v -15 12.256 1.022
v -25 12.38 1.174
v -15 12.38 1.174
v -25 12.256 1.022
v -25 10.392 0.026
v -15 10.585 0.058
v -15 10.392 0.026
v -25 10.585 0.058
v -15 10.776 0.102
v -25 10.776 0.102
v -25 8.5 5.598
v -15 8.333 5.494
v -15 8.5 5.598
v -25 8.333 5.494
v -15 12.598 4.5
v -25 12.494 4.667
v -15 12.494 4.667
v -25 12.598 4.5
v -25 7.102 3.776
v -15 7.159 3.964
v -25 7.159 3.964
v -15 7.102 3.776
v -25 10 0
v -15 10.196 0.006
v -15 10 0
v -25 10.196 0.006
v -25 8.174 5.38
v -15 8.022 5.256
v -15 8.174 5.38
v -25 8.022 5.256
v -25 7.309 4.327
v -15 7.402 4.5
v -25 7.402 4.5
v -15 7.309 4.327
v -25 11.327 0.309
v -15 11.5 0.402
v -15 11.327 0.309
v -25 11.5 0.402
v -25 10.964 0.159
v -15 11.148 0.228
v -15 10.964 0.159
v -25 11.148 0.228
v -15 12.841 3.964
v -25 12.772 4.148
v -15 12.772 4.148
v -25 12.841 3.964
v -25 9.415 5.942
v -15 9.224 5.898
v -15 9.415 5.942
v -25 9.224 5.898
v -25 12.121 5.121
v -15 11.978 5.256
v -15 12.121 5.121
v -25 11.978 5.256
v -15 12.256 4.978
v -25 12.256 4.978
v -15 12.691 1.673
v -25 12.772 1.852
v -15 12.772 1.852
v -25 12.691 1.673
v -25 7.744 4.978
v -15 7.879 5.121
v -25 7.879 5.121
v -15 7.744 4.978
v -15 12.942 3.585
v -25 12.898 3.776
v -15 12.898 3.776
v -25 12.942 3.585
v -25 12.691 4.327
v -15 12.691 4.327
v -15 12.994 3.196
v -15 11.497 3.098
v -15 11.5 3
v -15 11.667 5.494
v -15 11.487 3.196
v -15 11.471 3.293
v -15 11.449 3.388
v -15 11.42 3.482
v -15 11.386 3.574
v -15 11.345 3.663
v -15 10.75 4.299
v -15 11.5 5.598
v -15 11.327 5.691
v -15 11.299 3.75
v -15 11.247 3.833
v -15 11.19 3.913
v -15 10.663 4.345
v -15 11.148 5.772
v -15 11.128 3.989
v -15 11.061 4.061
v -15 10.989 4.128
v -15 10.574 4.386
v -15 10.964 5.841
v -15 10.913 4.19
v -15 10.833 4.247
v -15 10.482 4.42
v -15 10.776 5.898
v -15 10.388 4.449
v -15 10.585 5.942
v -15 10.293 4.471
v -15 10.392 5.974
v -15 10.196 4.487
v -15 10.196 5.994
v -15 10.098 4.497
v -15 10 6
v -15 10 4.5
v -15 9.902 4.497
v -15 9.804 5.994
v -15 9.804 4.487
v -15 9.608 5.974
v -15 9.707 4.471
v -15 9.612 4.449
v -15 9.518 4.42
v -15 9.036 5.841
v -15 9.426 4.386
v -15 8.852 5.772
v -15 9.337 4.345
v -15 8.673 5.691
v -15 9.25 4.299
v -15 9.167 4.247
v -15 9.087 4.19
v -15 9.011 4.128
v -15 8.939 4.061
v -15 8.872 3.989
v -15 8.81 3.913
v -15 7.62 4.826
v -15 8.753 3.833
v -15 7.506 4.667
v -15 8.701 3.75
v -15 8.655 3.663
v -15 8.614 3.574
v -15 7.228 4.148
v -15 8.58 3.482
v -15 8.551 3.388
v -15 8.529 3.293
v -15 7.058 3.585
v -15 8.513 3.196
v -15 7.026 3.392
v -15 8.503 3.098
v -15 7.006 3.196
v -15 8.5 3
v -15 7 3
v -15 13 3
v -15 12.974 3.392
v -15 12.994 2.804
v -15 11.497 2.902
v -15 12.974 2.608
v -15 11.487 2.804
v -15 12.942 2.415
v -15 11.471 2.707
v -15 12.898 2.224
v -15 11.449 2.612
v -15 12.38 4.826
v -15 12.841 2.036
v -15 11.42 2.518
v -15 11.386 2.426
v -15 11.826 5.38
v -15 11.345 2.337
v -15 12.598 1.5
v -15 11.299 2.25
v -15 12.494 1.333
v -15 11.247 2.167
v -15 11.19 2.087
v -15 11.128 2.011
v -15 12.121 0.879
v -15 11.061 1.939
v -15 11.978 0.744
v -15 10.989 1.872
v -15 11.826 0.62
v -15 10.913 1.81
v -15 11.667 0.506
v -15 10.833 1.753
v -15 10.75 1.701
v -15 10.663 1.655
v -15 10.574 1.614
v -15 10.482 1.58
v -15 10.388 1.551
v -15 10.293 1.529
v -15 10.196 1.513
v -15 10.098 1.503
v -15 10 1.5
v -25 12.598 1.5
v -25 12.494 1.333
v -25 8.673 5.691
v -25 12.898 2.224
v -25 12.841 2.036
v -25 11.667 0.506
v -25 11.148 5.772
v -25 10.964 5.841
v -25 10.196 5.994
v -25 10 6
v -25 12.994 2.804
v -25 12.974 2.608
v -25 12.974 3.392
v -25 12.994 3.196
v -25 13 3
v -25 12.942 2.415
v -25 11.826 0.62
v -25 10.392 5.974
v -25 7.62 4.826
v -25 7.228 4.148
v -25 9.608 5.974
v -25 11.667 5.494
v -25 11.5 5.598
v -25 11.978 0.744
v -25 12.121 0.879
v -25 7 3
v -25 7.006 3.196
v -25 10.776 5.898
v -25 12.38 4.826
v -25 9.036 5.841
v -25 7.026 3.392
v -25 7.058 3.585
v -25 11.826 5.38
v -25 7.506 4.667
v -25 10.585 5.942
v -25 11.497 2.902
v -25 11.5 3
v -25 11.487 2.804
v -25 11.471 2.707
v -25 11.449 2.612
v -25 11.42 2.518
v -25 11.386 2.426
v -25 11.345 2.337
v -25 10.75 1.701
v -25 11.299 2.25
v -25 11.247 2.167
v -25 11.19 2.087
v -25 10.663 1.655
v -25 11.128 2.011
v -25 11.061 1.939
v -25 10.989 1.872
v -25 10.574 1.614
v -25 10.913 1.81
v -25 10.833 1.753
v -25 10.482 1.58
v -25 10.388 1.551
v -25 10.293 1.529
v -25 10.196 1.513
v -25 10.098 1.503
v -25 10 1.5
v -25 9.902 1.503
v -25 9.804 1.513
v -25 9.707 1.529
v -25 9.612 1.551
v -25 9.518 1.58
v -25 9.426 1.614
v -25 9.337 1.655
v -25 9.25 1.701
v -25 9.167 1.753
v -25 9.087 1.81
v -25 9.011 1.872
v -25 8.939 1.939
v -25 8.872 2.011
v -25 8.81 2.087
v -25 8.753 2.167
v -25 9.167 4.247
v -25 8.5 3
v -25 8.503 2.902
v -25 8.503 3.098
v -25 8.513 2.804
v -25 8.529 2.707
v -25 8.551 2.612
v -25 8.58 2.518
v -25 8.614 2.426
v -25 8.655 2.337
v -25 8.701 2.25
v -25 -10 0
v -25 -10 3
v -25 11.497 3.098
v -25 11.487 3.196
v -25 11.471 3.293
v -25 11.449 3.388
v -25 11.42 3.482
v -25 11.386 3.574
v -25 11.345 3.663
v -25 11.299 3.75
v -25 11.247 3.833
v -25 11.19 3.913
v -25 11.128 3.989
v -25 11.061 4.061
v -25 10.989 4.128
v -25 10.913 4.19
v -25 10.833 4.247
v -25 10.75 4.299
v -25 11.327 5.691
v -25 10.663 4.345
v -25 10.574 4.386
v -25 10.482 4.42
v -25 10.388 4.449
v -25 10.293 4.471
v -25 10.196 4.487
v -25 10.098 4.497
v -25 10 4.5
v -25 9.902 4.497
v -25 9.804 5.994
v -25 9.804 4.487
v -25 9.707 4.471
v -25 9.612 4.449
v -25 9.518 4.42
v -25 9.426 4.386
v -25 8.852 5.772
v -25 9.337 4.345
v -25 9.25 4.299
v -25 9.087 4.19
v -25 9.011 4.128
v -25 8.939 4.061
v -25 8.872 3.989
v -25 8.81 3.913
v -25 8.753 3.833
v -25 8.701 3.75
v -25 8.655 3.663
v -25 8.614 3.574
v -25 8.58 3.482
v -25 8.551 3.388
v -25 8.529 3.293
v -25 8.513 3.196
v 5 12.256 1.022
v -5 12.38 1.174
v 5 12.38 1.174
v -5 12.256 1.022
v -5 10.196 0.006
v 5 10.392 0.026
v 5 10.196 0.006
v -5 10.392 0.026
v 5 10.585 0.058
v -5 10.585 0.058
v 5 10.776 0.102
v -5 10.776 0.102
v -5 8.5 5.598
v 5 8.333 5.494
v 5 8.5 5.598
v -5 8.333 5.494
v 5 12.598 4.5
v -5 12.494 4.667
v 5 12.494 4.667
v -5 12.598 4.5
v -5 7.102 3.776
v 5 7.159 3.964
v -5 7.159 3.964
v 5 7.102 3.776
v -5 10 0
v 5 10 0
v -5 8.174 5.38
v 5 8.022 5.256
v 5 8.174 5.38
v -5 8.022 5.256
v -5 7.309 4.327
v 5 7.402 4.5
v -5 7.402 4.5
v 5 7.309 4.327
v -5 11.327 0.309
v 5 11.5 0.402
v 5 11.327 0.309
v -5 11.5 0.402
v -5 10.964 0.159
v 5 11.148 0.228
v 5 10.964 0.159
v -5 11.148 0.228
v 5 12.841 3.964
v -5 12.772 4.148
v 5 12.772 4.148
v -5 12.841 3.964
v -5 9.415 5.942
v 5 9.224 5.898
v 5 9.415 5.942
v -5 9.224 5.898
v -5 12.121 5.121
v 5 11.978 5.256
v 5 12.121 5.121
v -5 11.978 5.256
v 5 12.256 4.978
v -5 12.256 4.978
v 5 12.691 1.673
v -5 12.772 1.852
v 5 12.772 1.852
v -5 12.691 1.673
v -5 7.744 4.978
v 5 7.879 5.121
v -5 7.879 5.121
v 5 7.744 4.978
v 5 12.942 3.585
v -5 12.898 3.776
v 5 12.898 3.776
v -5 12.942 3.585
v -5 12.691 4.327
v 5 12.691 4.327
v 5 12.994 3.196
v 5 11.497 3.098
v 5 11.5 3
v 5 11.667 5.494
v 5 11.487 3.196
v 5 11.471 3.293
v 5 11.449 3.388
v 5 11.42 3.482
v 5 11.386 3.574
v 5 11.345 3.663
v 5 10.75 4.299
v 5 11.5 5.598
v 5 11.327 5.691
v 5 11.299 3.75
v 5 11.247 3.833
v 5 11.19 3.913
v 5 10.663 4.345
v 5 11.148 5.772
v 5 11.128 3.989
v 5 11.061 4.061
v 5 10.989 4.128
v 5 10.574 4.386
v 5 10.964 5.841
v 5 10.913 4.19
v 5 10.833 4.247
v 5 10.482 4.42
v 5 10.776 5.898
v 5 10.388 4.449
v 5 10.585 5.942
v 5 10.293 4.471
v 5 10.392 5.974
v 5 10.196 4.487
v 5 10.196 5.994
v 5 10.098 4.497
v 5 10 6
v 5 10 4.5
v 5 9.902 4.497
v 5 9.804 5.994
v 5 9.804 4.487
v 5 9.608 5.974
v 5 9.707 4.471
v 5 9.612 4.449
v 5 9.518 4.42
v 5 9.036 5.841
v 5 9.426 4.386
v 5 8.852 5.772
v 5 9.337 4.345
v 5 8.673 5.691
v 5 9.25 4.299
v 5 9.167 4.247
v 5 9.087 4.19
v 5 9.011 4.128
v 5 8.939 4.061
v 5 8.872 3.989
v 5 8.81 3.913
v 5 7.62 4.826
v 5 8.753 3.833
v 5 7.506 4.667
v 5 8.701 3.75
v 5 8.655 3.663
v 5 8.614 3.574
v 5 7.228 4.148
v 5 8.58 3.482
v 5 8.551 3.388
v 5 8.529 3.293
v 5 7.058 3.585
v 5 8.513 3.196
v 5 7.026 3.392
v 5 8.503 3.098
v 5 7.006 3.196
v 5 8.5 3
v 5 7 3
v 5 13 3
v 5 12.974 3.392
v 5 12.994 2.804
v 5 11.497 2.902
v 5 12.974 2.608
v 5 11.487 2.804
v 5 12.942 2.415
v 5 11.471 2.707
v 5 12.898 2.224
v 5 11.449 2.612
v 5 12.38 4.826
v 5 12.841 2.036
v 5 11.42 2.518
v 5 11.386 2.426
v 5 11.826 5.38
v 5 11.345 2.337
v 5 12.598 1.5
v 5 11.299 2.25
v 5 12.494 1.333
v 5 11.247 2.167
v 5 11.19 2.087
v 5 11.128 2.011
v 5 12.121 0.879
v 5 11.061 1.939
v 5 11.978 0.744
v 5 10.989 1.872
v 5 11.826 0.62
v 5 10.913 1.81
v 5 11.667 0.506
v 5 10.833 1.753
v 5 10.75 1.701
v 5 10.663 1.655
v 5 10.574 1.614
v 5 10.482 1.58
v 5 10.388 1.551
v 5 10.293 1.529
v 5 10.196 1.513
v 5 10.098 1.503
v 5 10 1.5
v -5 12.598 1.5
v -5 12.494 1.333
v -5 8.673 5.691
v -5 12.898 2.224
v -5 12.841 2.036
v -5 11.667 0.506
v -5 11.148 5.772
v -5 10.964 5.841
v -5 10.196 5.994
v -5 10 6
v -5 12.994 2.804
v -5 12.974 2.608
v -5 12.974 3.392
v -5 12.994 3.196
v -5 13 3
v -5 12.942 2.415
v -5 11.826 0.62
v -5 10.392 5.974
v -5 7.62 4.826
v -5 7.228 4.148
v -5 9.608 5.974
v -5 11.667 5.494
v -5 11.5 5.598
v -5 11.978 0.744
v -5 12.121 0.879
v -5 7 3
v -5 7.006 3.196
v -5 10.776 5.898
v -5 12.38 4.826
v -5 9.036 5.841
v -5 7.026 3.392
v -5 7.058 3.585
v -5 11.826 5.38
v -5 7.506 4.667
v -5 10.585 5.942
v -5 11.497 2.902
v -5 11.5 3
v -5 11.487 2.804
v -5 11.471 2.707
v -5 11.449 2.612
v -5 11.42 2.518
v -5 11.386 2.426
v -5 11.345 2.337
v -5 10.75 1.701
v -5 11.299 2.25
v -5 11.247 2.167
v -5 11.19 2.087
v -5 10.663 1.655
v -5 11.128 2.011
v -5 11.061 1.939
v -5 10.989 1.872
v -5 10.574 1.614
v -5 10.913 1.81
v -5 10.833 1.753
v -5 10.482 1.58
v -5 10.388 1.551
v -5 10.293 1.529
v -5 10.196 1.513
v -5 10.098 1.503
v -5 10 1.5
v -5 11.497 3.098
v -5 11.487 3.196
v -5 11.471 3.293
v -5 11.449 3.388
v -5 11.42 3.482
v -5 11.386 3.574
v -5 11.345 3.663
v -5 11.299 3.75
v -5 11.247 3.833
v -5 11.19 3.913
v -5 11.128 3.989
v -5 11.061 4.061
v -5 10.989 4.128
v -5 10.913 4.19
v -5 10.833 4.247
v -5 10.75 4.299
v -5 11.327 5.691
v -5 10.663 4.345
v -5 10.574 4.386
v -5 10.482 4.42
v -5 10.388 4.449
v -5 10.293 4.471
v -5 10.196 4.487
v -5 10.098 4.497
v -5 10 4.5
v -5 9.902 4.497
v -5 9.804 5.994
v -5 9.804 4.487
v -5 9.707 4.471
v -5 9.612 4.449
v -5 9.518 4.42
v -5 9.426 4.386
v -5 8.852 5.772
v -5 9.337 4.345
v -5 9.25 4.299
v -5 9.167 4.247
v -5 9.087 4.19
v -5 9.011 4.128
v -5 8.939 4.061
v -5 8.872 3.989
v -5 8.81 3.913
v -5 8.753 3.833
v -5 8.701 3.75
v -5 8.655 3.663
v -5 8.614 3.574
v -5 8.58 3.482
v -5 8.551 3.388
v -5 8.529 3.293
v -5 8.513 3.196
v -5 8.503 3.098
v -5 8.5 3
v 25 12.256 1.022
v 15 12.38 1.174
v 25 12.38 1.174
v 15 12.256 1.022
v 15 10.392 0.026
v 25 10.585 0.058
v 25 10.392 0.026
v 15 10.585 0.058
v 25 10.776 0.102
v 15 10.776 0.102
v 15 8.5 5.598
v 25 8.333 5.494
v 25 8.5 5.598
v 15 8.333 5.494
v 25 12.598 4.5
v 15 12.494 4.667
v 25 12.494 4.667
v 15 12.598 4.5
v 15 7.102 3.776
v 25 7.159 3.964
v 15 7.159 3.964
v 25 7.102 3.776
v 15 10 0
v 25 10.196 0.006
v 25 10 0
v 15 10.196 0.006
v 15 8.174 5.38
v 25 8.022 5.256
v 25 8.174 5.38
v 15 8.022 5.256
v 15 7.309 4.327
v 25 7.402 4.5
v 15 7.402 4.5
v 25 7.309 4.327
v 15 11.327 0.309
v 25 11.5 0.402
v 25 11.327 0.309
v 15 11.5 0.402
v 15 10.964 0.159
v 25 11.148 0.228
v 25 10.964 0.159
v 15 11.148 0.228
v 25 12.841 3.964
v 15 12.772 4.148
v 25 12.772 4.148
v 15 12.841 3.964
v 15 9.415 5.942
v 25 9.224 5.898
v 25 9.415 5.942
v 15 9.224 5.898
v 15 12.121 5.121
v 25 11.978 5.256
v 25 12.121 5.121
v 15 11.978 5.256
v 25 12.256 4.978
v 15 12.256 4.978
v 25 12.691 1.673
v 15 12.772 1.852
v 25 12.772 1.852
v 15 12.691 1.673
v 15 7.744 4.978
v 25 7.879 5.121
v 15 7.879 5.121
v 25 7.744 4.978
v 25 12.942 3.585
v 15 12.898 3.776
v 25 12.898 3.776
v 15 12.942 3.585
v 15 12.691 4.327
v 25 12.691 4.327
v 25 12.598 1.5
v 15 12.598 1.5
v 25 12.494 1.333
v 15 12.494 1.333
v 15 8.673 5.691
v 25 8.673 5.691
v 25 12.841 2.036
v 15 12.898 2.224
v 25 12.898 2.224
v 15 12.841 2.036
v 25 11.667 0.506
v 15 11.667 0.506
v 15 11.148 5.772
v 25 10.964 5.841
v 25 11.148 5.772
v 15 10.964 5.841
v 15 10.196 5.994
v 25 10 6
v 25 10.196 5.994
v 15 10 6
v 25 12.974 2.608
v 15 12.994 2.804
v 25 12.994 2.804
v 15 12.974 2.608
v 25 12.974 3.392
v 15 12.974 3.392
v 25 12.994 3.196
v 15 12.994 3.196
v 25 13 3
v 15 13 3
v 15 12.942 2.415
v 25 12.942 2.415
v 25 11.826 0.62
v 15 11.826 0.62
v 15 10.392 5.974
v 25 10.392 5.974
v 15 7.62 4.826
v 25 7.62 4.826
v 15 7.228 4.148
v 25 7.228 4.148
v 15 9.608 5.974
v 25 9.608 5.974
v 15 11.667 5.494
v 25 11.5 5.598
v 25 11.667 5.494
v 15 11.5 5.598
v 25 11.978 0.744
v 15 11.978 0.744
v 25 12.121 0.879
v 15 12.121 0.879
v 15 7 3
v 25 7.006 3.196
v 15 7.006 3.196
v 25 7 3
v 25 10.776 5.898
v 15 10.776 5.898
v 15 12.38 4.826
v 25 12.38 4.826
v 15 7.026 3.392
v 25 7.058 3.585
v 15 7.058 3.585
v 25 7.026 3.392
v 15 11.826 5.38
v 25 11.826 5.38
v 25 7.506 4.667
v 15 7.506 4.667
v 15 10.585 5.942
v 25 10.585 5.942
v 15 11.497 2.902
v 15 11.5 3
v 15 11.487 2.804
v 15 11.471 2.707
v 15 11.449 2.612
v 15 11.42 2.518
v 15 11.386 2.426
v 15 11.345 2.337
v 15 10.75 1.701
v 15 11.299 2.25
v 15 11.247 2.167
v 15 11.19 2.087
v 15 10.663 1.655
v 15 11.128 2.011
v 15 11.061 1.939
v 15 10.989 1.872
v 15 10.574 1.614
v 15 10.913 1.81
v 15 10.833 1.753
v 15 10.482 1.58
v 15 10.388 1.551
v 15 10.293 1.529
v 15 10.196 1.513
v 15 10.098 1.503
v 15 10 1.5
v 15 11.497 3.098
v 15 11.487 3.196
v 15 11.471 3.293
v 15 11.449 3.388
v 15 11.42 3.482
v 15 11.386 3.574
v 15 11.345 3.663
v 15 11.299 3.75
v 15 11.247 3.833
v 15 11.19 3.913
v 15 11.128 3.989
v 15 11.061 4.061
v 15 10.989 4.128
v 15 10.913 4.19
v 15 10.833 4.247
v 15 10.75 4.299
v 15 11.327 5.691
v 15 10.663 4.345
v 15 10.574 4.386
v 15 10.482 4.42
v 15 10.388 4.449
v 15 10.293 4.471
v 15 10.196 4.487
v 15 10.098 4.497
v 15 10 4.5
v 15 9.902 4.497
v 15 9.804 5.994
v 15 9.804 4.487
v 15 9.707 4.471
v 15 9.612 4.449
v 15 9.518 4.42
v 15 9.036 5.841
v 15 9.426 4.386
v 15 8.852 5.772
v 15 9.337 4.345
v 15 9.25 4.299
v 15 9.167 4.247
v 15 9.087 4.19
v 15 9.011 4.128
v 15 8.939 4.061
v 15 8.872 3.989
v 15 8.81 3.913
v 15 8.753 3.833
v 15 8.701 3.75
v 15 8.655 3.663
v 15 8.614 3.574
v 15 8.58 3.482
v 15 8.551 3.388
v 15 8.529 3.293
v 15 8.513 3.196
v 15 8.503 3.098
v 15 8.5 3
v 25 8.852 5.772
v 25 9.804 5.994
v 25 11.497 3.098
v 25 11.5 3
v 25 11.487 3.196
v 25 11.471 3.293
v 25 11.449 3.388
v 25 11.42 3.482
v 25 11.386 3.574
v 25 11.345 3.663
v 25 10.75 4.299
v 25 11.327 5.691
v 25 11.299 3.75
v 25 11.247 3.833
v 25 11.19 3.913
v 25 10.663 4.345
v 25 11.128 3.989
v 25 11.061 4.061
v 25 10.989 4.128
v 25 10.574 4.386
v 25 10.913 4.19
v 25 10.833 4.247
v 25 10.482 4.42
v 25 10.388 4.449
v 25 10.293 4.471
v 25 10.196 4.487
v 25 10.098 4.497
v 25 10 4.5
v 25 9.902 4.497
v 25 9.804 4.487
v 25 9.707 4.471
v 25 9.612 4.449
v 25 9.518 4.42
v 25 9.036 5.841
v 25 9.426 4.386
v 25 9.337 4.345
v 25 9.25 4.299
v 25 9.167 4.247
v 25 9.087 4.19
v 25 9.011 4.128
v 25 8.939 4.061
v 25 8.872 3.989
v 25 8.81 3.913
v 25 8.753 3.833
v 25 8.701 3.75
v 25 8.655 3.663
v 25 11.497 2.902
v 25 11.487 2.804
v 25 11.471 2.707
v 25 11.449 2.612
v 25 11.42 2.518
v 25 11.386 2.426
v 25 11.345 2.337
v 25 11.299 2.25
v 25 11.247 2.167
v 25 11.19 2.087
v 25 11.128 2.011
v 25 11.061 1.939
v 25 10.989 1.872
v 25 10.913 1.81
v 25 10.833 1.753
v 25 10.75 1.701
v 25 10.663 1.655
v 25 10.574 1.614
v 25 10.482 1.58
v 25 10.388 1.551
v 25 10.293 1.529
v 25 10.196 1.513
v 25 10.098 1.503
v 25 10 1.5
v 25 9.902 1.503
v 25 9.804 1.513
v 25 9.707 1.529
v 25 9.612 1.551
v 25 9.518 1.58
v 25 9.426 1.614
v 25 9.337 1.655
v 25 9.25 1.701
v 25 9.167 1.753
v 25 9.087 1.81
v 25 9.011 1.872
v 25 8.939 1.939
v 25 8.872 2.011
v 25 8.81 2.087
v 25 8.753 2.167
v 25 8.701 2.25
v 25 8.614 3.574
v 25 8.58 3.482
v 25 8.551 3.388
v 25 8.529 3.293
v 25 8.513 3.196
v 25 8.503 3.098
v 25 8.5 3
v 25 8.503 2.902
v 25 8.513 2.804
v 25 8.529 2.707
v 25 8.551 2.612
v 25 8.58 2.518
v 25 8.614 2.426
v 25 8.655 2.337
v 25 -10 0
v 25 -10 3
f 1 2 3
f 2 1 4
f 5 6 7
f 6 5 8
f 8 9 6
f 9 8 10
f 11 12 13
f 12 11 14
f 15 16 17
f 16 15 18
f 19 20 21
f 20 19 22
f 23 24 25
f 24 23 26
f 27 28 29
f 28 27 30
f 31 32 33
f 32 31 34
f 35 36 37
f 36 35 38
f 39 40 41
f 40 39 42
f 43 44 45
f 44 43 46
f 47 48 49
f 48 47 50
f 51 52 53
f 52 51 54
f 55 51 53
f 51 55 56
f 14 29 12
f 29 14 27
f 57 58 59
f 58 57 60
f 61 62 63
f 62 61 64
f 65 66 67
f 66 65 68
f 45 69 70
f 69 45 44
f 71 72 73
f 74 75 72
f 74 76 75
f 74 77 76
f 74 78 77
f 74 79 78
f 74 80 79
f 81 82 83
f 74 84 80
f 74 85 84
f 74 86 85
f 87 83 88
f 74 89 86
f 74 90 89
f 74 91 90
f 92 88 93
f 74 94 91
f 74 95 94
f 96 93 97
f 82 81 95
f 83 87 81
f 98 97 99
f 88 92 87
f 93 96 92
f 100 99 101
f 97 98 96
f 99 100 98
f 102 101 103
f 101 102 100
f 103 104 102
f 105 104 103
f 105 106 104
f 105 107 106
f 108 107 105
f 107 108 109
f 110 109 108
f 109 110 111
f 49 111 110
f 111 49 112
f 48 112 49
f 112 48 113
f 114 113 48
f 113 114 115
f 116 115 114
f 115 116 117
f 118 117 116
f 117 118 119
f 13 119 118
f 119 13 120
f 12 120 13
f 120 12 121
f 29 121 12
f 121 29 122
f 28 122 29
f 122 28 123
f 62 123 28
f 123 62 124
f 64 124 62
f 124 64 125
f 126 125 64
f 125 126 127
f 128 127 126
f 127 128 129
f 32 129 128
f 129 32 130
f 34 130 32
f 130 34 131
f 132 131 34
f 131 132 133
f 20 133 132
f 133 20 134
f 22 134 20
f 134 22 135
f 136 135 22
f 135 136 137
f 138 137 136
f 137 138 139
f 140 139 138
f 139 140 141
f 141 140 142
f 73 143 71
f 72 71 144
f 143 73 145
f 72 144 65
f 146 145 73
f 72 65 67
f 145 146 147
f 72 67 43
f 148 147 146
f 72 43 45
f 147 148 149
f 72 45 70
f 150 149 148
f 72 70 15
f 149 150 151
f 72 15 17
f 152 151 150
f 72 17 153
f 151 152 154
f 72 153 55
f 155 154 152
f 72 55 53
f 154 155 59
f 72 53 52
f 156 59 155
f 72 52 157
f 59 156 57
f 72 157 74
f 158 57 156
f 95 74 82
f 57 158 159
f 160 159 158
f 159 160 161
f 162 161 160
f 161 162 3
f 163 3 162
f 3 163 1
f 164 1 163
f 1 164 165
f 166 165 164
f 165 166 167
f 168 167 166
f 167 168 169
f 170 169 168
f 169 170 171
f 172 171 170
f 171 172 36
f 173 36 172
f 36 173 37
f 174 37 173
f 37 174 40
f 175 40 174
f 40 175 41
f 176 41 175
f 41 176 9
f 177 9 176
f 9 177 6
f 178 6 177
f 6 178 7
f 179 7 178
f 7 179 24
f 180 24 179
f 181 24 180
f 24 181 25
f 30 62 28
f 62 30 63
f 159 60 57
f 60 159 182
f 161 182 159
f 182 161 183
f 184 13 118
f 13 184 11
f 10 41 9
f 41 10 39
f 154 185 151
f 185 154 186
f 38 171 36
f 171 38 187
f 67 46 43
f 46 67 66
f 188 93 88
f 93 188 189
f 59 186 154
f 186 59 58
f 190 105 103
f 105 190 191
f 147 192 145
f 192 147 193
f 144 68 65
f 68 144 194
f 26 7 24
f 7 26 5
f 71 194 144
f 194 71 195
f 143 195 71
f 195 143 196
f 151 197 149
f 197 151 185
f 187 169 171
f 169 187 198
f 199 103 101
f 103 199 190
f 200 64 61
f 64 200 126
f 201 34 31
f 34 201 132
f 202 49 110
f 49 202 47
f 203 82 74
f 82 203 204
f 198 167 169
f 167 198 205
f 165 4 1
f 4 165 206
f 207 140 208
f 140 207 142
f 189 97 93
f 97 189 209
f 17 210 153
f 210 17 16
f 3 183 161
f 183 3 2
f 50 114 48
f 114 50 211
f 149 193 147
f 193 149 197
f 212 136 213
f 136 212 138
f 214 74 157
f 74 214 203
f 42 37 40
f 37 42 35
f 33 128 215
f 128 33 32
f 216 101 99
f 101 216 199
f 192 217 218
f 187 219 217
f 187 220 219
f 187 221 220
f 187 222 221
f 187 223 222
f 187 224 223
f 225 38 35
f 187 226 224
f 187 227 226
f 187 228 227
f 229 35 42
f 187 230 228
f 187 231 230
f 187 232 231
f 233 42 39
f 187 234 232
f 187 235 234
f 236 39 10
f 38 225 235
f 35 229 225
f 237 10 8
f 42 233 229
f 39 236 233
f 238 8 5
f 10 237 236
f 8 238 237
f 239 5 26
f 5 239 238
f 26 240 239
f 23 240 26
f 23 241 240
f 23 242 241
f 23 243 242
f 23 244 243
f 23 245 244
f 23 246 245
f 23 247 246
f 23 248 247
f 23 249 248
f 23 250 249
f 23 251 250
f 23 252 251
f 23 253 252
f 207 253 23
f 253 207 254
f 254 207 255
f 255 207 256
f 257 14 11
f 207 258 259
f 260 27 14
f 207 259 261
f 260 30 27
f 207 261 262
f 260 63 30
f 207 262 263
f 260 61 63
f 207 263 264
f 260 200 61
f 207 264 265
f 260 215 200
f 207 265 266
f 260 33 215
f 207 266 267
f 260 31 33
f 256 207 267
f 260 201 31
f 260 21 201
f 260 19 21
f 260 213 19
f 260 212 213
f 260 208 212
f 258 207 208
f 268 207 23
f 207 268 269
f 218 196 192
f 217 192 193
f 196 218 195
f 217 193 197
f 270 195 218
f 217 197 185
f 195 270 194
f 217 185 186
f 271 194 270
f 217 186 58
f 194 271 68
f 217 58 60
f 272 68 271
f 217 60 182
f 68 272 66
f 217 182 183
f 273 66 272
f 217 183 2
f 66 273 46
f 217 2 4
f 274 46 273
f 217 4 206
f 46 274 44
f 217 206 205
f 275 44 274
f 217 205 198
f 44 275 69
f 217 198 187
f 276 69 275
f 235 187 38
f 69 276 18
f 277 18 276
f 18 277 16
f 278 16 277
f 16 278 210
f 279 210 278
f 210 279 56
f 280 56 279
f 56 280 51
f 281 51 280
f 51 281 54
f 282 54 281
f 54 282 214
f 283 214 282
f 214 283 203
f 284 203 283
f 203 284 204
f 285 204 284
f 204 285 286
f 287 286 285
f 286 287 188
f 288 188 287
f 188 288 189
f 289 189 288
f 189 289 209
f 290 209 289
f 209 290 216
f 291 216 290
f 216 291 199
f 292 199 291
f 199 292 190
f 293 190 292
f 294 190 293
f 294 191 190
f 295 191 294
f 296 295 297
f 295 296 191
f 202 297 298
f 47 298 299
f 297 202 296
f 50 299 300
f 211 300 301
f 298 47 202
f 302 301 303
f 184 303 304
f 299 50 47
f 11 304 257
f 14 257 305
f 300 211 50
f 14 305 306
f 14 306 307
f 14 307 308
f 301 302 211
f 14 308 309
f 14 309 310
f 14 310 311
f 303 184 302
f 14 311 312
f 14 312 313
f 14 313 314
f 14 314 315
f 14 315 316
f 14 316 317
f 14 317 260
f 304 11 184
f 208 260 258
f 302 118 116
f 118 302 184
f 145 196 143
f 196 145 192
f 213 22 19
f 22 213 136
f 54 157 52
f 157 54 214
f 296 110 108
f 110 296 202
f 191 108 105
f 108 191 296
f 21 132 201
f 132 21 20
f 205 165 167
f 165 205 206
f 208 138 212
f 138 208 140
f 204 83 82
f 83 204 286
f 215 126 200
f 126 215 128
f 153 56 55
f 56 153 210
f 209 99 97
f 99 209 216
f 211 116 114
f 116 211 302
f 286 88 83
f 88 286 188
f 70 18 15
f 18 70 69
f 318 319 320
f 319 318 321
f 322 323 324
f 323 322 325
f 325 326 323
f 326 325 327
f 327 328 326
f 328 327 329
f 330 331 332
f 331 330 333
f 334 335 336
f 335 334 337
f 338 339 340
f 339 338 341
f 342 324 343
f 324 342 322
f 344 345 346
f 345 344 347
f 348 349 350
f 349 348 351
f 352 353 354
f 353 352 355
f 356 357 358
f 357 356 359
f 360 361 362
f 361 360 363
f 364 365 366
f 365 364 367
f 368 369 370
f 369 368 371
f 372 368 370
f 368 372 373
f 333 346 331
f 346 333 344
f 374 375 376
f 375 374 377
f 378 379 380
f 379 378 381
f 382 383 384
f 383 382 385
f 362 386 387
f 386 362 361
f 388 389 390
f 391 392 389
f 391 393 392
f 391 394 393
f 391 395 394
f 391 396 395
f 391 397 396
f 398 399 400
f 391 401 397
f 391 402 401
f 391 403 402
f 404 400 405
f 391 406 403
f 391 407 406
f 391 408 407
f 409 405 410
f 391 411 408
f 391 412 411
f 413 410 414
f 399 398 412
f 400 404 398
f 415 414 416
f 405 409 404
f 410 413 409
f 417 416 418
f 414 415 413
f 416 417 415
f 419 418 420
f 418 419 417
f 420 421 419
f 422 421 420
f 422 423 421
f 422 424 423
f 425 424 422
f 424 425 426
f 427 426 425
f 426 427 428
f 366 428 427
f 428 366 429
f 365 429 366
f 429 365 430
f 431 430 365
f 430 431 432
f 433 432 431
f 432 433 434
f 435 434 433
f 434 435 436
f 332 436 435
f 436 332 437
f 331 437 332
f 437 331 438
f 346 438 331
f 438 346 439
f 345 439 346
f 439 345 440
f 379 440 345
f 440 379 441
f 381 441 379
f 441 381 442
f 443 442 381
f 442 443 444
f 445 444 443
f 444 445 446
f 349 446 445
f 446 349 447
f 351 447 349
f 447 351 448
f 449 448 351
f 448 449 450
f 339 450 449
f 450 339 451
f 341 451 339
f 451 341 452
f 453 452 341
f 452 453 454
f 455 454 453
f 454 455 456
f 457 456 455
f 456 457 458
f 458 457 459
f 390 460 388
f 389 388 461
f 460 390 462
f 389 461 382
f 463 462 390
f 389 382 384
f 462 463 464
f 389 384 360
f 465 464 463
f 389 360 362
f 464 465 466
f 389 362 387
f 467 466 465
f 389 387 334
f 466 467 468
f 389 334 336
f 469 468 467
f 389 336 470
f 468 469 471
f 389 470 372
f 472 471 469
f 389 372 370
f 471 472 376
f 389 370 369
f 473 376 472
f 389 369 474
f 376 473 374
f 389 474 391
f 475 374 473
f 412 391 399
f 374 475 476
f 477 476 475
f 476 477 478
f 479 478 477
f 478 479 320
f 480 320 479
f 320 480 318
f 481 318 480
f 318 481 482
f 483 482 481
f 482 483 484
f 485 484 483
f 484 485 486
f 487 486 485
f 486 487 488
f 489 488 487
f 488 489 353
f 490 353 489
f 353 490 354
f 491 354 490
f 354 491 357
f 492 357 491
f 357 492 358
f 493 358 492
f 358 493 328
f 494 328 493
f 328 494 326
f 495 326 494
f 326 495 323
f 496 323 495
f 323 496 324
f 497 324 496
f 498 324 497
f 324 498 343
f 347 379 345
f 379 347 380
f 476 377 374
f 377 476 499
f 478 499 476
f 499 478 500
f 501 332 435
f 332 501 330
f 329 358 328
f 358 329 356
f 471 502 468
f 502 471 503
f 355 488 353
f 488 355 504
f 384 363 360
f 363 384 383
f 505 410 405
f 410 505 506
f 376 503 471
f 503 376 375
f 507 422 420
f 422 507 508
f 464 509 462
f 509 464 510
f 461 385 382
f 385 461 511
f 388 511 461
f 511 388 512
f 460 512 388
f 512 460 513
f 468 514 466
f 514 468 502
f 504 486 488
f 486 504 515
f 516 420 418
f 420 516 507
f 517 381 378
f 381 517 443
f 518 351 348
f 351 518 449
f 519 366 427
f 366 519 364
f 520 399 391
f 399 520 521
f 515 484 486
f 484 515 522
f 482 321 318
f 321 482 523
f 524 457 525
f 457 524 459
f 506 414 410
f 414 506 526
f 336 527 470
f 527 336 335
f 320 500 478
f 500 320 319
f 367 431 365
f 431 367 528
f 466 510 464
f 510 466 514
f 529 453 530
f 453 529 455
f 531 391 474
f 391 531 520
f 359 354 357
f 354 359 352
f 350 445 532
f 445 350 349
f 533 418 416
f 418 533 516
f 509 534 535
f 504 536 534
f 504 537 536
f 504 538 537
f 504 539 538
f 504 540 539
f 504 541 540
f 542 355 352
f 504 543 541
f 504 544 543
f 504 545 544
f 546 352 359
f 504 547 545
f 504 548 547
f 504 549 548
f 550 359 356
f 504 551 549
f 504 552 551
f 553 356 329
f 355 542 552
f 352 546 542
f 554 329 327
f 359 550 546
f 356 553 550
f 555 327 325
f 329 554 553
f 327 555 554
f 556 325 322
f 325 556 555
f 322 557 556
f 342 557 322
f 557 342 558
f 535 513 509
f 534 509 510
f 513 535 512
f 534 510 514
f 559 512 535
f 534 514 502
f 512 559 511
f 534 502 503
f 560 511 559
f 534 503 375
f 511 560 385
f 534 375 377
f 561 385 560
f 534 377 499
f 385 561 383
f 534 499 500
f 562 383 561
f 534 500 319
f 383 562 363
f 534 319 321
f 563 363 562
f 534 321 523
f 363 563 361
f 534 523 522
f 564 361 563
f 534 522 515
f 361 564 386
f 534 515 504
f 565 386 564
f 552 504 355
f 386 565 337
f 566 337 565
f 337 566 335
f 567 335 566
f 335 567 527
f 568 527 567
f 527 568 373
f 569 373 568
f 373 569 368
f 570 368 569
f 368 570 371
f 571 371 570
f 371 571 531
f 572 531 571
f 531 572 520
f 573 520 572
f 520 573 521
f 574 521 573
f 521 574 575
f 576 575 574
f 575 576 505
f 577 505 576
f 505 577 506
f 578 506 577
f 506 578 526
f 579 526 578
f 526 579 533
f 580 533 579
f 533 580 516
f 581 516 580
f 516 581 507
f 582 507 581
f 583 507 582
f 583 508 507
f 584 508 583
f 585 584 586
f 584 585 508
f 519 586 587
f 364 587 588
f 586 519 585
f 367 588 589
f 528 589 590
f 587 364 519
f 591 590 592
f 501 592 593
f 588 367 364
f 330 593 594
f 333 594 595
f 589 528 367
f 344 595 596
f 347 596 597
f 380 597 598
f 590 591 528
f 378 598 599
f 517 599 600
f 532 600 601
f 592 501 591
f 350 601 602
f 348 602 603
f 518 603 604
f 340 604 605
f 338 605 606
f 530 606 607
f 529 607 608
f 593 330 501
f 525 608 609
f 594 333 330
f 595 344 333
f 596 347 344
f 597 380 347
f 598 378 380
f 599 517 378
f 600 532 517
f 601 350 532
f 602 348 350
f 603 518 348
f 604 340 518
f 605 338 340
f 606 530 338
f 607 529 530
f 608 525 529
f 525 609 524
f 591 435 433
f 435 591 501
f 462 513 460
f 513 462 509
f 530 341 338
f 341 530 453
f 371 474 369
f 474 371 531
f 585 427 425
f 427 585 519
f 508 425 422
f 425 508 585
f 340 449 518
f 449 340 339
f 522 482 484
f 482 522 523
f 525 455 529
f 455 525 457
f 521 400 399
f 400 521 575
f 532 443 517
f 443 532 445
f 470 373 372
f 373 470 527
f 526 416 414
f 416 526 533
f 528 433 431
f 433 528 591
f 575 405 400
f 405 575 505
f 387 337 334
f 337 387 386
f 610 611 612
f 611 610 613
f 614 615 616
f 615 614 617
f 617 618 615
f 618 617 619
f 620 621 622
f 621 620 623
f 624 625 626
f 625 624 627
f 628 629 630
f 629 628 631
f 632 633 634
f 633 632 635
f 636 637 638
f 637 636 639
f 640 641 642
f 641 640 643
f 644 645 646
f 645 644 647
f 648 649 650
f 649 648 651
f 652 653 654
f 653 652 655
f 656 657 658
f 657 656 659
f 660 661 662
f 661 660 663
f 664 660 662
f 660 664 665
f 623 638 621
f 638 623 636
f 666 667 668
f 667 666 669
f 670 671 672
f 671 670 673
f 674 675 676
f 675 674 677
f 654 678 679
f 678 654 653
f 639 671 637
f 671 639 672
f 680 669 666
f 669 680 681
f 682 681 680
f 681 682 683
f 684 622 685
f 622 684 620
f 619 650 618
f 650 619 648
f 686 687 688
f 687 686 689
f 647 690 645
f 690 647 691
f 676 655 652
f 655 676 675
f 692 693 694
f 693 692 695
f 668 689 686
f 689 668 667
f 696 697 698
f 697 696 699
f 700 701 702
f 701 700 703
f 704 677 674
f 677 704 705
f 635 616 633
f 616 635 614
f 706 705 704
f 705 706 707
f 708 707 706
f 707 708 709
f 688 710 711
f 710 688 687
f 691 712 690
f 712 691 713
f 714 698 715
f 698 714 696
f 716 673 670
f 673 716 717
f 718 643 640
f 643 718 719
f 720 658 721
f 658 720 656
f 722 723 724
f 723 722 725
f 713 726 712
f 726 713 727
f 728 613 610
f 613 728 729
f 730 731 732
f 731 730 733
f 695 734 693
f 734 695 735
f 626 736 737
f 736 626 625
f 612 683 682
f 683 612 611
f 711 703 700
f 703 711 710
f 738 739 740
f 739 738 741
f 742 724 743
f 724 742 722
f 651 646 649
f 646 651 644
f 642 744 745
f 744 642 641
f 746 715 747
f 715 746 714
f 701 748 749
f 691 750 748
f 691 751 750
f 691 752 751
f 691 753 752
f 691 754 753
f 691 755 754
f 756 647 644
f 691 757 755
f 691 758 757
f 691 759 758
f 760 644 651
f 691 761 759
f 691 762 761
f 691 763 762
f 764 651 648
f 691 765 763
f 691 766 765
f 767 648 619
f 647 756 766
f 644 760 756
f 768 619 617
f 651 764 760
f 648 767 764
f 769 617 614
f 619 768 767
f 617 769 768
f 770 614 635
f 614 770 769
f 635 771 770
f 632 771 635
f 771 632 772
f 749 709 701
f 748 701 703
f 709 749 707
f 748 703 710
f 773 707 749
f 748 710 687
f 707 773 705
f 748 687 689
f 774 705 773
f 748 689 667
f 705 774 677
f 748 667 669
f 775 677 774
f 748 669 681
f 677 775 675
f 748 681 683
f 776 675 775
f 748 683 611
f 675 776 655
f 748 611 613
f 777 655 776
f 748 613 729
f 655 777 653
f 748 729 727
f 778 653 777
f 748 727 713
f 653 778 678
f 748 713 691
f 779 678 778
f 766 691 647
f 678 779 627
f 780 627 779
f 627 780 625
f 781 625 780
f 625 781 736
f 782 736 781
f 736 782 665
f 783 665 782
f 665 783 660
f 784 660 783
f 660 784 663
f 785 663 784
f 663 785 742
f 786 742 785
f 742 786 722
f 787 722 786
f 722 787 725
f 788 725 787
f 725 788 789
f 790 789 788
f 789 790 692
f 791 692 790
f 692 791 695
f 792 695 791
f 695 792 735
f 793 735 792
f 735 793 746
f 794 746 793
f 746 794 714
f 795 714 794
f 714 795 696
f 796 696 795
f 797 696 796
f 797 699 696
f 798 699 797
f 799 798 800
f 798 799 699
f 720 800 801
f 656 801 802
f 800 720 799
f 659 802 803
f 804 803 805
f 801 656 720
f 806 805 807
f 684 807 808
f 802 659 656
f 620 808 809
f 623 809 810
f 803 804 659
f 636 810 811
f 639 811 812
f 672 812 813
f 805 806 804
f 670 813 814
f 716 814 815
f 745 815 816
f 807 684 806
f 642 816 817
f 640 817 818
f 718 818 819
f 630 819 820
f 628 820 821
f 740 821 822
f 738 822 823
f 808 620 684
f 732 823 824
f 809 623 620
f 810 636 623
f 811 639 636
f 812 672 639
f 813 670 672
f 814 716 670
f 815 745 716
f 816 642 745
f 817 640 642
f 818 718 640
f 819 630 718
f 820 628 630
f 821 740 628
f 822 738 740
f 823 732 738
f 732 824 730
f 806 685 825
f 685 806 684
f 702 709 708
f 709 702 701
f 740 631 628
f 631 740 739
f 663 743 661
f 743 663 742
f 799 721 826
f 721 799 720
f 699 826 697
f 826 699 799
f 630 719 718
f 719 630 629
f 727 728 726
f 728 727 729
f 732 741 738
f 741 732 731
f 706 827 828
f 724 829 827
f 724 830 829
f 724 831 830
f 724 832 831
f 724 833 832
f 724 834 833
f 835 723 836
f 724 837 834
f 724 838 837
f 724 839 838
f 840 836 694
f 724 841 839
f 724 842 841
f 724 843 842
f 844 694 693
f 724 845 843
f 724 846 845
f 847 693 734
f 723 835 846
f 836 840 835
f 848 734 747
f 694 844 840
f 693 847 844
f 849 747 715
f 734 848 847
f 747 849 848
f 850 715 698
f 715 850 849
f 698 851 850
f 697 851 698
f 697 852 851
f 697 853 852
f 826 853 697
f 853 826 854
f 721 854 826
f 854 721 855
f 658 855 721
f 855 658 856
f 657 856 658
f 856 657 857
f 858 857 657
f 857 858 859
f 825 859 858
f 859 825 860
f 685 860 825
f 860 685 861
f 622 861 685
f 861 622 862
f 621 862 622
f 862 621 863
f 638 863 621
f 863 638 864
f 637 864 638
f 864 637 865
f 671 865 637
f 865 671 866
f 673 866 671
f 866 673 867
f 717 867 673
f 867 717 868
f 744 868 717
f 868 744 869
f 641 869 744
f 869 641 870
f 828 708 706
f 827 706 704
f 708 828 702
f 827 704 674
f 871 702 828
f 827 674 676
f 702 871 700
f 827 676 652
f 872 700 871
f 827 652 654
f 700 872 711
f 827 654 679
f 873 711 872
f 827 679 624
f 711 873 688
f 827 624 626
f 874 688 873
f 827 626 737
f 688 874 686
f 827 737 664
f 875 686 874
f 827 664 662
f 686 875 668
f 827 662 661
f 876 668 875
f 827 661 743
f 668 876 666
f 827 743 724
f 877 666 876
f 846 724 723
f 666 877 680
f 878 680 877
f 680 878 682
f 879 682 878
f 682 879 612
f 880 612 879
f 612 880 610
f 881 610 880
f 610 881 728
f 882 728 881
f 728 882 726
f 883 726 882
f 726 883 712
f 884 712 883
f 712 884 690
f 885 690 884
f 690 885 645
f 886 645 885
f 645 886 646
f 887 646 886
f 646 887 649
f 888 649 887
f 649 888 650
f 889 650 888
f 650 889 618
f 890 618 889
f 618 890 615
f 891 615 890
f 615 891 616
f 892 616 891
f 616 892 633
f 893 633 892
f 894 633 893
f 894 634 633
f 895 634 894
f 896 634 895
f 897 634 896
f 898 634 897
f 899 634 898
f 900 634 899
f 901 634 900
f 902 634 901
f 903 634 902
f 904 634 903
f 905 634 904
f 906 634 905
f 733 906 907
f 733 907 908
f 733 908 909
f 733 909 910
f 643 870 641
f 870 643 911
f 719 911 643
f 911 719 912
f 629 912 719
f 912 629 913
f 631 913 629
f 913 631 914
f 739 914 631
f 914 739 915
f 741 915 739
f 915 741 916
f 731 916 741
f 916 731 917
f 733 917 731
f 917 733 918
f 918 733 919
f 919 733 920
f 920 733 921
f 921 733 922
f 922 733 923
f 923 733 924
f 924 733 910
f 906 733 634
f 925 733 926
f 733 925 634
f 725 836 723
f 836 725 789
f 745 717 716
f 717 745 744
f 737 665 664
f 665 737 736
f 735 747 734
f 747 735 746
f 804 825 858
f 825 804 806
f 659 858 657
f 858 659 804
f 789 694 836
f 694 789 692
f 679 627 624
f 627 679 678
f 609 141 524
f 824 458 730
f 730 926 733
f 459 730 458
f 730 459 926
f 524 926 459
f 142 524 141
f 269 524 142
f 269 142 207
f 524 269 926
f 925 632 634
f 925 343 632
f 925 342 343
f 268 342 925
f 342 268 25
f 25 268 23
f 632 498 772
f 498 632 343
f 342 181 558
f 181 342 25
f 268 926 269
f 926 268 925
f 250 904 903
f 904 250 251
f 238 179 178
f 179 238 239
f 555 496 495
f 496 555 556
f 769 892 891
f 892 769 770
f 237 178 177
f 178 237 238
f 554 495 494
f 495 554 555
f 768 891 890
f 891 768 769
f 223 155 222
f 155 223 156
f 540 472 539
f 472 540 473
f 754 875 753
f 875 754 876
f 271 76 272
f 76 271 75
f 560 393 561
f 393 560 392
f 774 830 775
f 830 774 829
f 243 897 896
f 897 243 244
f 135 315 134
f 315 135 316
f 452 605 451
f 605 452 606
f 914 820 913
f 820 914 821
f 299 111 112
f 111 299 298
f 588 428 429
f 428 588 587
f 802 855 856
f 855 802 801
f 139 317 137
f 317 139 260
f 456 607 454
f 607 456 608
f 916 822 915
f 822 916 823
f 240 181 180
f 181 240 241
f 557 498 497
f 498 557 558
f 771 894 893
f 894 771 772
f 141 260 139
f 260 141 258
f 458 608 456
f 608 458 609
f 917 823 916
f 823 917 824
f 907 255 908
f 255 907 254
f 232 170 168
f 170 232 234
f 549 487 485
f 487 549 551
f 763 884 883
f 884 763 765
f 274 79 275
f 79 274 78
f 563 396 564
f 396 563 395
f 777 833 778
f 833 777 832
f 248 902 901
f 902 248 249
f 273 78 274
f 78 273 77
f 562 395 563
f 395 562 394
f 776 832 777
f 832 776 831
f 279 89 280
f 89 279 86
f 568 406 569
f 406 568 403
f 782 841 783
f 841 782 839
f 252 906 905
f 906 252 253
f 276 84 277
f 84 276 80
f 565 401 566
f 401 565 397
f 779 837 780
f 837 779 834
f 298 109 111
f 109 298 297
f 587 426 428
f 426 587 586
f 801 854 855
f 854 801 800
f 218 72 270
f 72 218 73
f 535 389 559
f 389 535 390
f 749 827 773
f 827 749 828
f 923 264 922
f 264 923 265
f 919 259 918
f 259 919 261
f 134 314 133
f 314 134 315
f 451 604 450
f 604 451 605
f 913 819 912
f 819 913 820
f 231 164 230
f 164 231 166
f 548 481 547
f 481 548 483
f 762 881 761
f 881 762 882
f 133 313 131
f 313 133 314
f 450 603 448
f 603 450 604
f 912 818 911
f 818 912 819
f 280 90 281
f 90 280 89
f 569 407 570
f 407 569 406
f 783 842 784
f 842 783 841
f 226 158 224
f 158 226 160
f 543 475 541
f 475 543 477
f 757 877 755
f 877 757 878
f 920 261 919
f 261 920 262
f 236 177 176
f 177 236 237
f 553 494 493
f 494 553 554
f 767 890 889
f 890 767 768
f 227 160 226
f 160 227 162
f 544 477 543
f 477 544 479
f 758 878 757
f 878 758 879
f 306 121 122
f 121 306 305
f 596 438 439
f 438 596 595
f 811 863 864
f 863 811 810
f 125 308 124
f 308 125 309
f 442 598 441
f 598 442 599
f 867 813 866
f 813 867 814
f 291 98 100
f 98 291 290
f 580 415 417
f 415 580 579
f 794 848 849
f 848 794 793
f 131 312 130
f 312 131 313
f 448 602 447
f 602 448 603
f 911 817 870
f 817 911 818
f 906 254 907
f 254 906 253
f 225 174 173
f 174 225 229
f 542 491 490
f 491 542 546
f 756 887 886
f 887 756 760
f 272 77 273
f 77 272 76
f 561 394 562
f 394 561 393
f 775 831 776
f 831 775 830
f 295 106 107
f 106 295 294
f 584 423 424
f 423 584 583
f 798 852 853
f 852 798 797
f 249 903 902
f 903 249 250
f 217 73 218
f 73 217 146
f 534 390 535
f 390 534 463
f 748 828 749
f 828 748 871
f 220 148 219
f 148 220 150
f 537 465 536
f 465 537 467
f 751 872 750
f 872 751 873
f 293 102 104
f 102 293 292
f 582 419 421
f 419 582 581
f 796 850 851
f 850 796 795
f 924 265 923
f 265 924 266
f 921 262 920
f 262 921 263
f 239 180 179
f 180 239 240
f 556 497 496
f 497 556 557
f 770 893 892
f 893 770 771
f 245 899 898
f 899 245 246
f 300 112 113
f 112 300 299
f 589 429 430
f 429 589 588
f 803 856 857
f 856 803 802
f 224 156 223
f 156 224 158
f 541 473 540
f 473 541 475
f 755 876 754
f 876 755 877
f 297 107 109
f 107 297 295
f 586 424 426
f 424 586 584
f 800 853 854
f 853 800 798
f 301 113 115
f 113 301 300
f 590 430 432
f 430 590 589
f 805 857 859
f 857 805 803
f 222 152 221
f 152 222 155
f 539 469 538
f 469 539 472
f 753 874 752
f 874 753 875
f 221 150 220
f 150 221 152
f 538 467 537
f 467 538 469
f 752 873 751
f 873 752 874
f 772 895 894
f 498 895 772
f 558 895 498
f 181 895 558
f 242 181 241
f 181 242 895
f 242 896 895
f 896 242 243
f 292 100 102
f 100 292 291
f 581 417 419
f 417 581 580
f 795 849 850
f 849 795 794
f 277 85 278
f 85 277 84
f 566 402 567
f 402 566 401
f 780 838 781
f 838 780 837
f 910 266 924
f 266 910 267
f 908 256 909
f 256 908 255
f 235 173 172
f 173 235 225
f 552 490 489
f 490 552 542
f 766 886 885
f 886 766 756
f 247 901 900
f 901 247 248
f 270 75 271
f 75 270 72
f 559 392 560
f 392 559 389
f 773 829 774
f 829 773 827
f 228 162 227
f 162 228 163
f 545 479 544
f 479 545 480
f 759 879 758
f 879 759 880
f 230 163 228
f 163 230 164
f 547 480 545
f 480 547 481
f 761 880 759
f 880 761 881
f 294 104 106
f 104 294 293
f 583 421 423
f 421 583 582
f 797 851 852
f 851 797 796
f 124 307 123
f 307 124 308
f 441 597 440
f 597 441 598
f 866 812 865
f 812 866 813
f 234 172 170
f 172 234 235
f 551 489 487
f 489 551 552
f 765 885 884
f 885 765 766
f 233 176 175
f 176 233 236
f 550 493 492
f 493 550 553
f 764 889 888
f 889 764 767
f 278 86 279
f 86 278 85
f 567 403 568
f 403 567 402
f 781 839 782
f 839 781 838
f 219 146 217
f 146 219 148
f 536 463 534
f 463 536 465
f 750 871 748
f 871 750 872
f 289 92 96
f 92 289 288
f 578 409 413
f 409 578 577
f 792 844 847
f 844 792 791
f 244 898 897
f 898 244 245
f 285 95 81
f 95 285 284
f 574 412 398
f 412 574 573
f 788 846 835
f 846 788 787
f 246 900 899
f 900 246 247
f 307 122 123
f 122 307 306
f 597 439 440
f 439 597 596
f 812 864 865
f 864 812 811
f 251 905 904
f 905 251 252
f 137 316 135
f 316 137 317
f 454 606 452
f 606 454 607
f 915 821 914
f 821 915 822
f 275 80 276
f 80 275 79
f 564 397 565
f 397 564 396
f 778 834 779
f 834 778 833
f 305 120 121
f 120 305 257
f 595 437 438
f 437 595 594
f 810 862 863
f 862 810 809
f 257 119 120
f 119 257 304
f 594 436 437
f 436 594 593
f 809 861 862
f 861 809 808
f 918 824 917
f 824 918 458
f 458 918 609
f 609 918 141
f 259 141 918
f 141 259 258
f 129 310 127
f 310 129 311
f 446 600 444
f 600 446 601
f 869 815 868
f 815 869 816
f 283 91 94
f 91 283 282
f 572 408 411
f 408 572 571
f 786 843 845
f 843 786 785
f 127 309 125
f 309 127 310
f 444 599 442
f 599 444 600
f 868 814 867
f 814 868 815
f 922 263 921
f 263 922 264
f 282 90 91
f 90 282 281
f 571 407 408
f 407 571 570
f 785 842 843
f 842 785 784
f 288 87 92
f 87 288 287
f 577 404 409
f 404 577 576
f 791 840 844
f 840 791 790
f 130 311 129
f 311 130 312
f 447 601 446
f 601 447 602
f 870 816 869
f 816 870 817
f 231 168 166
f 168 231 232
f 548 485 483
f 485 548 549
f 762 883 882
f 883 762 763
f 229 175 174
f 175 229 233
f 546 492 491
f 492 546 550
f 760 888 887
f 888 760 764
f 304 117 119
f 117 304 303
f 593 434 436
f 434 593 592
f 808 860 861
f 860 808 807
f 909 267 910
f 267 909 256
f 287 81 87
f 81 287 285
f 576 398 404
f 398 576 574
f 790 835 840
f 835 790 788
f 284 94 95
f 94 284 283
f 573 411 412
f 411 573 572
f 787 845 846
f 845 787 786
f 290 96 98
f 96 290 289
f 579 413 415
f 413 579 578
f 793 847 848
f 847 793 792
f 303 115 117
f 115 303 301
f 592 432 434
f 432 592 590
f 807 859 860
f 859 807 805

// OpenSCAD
// Pin hinge leaf - one half of a 5-knuckle pin hinge
// Print orientation: plate flat on bed, knuckles along +Y edge

$fn = 96;

// ---- Plate ----
plate_len   = 50;   // length along X
plate_wid   = 20;   // width along Y
plate_thk   = 3;    // thickness along Z

// ---- Knuckles ----
n_segments  = 5;                       // total hinge segments along length
seg_len     = plate_len / n_segments;  // 10 mm per segment
knuckle_d   = 6;                       // knuckle outer diameter
knuckle_y   = plate_wid / 2;           // axis Y position (y = 10)
knuckle_z   = 3;                       // axis Z position (z = 3)

// ---- Pin hole ----
pin_d       = 3;    // pin hole diameter
eps         = 0.5;  // overshoot for clean cuts

difference() {
    union() {
        // Flat plate centred on origin
        translate([-plate_len/2, -plate_wid/2, 0])
            cube([plate_len, plate_wid, plate_thk]);

        // Knuckles on 1st, 3rd, 5th segments (indices 0, 2, 4)
        for (i = [0 : 2 : n_segments - 1])
            translate([-plate_len/2 + i*seg_len, knuckle_y, knuckle_z])
                rotate([0, 90, 0])
                    cylinder(d = knuckle_d, h = seg_len);
    }

    // Pin hole along the common knuckle axis, through all knuckles
    translate([-plate_len/2 - eps, knuckle_y, knuckle_z])
        rotate([0, 90, 0])
            cylinder(d = pin_d, h = plate_len + 2*eps);
}
